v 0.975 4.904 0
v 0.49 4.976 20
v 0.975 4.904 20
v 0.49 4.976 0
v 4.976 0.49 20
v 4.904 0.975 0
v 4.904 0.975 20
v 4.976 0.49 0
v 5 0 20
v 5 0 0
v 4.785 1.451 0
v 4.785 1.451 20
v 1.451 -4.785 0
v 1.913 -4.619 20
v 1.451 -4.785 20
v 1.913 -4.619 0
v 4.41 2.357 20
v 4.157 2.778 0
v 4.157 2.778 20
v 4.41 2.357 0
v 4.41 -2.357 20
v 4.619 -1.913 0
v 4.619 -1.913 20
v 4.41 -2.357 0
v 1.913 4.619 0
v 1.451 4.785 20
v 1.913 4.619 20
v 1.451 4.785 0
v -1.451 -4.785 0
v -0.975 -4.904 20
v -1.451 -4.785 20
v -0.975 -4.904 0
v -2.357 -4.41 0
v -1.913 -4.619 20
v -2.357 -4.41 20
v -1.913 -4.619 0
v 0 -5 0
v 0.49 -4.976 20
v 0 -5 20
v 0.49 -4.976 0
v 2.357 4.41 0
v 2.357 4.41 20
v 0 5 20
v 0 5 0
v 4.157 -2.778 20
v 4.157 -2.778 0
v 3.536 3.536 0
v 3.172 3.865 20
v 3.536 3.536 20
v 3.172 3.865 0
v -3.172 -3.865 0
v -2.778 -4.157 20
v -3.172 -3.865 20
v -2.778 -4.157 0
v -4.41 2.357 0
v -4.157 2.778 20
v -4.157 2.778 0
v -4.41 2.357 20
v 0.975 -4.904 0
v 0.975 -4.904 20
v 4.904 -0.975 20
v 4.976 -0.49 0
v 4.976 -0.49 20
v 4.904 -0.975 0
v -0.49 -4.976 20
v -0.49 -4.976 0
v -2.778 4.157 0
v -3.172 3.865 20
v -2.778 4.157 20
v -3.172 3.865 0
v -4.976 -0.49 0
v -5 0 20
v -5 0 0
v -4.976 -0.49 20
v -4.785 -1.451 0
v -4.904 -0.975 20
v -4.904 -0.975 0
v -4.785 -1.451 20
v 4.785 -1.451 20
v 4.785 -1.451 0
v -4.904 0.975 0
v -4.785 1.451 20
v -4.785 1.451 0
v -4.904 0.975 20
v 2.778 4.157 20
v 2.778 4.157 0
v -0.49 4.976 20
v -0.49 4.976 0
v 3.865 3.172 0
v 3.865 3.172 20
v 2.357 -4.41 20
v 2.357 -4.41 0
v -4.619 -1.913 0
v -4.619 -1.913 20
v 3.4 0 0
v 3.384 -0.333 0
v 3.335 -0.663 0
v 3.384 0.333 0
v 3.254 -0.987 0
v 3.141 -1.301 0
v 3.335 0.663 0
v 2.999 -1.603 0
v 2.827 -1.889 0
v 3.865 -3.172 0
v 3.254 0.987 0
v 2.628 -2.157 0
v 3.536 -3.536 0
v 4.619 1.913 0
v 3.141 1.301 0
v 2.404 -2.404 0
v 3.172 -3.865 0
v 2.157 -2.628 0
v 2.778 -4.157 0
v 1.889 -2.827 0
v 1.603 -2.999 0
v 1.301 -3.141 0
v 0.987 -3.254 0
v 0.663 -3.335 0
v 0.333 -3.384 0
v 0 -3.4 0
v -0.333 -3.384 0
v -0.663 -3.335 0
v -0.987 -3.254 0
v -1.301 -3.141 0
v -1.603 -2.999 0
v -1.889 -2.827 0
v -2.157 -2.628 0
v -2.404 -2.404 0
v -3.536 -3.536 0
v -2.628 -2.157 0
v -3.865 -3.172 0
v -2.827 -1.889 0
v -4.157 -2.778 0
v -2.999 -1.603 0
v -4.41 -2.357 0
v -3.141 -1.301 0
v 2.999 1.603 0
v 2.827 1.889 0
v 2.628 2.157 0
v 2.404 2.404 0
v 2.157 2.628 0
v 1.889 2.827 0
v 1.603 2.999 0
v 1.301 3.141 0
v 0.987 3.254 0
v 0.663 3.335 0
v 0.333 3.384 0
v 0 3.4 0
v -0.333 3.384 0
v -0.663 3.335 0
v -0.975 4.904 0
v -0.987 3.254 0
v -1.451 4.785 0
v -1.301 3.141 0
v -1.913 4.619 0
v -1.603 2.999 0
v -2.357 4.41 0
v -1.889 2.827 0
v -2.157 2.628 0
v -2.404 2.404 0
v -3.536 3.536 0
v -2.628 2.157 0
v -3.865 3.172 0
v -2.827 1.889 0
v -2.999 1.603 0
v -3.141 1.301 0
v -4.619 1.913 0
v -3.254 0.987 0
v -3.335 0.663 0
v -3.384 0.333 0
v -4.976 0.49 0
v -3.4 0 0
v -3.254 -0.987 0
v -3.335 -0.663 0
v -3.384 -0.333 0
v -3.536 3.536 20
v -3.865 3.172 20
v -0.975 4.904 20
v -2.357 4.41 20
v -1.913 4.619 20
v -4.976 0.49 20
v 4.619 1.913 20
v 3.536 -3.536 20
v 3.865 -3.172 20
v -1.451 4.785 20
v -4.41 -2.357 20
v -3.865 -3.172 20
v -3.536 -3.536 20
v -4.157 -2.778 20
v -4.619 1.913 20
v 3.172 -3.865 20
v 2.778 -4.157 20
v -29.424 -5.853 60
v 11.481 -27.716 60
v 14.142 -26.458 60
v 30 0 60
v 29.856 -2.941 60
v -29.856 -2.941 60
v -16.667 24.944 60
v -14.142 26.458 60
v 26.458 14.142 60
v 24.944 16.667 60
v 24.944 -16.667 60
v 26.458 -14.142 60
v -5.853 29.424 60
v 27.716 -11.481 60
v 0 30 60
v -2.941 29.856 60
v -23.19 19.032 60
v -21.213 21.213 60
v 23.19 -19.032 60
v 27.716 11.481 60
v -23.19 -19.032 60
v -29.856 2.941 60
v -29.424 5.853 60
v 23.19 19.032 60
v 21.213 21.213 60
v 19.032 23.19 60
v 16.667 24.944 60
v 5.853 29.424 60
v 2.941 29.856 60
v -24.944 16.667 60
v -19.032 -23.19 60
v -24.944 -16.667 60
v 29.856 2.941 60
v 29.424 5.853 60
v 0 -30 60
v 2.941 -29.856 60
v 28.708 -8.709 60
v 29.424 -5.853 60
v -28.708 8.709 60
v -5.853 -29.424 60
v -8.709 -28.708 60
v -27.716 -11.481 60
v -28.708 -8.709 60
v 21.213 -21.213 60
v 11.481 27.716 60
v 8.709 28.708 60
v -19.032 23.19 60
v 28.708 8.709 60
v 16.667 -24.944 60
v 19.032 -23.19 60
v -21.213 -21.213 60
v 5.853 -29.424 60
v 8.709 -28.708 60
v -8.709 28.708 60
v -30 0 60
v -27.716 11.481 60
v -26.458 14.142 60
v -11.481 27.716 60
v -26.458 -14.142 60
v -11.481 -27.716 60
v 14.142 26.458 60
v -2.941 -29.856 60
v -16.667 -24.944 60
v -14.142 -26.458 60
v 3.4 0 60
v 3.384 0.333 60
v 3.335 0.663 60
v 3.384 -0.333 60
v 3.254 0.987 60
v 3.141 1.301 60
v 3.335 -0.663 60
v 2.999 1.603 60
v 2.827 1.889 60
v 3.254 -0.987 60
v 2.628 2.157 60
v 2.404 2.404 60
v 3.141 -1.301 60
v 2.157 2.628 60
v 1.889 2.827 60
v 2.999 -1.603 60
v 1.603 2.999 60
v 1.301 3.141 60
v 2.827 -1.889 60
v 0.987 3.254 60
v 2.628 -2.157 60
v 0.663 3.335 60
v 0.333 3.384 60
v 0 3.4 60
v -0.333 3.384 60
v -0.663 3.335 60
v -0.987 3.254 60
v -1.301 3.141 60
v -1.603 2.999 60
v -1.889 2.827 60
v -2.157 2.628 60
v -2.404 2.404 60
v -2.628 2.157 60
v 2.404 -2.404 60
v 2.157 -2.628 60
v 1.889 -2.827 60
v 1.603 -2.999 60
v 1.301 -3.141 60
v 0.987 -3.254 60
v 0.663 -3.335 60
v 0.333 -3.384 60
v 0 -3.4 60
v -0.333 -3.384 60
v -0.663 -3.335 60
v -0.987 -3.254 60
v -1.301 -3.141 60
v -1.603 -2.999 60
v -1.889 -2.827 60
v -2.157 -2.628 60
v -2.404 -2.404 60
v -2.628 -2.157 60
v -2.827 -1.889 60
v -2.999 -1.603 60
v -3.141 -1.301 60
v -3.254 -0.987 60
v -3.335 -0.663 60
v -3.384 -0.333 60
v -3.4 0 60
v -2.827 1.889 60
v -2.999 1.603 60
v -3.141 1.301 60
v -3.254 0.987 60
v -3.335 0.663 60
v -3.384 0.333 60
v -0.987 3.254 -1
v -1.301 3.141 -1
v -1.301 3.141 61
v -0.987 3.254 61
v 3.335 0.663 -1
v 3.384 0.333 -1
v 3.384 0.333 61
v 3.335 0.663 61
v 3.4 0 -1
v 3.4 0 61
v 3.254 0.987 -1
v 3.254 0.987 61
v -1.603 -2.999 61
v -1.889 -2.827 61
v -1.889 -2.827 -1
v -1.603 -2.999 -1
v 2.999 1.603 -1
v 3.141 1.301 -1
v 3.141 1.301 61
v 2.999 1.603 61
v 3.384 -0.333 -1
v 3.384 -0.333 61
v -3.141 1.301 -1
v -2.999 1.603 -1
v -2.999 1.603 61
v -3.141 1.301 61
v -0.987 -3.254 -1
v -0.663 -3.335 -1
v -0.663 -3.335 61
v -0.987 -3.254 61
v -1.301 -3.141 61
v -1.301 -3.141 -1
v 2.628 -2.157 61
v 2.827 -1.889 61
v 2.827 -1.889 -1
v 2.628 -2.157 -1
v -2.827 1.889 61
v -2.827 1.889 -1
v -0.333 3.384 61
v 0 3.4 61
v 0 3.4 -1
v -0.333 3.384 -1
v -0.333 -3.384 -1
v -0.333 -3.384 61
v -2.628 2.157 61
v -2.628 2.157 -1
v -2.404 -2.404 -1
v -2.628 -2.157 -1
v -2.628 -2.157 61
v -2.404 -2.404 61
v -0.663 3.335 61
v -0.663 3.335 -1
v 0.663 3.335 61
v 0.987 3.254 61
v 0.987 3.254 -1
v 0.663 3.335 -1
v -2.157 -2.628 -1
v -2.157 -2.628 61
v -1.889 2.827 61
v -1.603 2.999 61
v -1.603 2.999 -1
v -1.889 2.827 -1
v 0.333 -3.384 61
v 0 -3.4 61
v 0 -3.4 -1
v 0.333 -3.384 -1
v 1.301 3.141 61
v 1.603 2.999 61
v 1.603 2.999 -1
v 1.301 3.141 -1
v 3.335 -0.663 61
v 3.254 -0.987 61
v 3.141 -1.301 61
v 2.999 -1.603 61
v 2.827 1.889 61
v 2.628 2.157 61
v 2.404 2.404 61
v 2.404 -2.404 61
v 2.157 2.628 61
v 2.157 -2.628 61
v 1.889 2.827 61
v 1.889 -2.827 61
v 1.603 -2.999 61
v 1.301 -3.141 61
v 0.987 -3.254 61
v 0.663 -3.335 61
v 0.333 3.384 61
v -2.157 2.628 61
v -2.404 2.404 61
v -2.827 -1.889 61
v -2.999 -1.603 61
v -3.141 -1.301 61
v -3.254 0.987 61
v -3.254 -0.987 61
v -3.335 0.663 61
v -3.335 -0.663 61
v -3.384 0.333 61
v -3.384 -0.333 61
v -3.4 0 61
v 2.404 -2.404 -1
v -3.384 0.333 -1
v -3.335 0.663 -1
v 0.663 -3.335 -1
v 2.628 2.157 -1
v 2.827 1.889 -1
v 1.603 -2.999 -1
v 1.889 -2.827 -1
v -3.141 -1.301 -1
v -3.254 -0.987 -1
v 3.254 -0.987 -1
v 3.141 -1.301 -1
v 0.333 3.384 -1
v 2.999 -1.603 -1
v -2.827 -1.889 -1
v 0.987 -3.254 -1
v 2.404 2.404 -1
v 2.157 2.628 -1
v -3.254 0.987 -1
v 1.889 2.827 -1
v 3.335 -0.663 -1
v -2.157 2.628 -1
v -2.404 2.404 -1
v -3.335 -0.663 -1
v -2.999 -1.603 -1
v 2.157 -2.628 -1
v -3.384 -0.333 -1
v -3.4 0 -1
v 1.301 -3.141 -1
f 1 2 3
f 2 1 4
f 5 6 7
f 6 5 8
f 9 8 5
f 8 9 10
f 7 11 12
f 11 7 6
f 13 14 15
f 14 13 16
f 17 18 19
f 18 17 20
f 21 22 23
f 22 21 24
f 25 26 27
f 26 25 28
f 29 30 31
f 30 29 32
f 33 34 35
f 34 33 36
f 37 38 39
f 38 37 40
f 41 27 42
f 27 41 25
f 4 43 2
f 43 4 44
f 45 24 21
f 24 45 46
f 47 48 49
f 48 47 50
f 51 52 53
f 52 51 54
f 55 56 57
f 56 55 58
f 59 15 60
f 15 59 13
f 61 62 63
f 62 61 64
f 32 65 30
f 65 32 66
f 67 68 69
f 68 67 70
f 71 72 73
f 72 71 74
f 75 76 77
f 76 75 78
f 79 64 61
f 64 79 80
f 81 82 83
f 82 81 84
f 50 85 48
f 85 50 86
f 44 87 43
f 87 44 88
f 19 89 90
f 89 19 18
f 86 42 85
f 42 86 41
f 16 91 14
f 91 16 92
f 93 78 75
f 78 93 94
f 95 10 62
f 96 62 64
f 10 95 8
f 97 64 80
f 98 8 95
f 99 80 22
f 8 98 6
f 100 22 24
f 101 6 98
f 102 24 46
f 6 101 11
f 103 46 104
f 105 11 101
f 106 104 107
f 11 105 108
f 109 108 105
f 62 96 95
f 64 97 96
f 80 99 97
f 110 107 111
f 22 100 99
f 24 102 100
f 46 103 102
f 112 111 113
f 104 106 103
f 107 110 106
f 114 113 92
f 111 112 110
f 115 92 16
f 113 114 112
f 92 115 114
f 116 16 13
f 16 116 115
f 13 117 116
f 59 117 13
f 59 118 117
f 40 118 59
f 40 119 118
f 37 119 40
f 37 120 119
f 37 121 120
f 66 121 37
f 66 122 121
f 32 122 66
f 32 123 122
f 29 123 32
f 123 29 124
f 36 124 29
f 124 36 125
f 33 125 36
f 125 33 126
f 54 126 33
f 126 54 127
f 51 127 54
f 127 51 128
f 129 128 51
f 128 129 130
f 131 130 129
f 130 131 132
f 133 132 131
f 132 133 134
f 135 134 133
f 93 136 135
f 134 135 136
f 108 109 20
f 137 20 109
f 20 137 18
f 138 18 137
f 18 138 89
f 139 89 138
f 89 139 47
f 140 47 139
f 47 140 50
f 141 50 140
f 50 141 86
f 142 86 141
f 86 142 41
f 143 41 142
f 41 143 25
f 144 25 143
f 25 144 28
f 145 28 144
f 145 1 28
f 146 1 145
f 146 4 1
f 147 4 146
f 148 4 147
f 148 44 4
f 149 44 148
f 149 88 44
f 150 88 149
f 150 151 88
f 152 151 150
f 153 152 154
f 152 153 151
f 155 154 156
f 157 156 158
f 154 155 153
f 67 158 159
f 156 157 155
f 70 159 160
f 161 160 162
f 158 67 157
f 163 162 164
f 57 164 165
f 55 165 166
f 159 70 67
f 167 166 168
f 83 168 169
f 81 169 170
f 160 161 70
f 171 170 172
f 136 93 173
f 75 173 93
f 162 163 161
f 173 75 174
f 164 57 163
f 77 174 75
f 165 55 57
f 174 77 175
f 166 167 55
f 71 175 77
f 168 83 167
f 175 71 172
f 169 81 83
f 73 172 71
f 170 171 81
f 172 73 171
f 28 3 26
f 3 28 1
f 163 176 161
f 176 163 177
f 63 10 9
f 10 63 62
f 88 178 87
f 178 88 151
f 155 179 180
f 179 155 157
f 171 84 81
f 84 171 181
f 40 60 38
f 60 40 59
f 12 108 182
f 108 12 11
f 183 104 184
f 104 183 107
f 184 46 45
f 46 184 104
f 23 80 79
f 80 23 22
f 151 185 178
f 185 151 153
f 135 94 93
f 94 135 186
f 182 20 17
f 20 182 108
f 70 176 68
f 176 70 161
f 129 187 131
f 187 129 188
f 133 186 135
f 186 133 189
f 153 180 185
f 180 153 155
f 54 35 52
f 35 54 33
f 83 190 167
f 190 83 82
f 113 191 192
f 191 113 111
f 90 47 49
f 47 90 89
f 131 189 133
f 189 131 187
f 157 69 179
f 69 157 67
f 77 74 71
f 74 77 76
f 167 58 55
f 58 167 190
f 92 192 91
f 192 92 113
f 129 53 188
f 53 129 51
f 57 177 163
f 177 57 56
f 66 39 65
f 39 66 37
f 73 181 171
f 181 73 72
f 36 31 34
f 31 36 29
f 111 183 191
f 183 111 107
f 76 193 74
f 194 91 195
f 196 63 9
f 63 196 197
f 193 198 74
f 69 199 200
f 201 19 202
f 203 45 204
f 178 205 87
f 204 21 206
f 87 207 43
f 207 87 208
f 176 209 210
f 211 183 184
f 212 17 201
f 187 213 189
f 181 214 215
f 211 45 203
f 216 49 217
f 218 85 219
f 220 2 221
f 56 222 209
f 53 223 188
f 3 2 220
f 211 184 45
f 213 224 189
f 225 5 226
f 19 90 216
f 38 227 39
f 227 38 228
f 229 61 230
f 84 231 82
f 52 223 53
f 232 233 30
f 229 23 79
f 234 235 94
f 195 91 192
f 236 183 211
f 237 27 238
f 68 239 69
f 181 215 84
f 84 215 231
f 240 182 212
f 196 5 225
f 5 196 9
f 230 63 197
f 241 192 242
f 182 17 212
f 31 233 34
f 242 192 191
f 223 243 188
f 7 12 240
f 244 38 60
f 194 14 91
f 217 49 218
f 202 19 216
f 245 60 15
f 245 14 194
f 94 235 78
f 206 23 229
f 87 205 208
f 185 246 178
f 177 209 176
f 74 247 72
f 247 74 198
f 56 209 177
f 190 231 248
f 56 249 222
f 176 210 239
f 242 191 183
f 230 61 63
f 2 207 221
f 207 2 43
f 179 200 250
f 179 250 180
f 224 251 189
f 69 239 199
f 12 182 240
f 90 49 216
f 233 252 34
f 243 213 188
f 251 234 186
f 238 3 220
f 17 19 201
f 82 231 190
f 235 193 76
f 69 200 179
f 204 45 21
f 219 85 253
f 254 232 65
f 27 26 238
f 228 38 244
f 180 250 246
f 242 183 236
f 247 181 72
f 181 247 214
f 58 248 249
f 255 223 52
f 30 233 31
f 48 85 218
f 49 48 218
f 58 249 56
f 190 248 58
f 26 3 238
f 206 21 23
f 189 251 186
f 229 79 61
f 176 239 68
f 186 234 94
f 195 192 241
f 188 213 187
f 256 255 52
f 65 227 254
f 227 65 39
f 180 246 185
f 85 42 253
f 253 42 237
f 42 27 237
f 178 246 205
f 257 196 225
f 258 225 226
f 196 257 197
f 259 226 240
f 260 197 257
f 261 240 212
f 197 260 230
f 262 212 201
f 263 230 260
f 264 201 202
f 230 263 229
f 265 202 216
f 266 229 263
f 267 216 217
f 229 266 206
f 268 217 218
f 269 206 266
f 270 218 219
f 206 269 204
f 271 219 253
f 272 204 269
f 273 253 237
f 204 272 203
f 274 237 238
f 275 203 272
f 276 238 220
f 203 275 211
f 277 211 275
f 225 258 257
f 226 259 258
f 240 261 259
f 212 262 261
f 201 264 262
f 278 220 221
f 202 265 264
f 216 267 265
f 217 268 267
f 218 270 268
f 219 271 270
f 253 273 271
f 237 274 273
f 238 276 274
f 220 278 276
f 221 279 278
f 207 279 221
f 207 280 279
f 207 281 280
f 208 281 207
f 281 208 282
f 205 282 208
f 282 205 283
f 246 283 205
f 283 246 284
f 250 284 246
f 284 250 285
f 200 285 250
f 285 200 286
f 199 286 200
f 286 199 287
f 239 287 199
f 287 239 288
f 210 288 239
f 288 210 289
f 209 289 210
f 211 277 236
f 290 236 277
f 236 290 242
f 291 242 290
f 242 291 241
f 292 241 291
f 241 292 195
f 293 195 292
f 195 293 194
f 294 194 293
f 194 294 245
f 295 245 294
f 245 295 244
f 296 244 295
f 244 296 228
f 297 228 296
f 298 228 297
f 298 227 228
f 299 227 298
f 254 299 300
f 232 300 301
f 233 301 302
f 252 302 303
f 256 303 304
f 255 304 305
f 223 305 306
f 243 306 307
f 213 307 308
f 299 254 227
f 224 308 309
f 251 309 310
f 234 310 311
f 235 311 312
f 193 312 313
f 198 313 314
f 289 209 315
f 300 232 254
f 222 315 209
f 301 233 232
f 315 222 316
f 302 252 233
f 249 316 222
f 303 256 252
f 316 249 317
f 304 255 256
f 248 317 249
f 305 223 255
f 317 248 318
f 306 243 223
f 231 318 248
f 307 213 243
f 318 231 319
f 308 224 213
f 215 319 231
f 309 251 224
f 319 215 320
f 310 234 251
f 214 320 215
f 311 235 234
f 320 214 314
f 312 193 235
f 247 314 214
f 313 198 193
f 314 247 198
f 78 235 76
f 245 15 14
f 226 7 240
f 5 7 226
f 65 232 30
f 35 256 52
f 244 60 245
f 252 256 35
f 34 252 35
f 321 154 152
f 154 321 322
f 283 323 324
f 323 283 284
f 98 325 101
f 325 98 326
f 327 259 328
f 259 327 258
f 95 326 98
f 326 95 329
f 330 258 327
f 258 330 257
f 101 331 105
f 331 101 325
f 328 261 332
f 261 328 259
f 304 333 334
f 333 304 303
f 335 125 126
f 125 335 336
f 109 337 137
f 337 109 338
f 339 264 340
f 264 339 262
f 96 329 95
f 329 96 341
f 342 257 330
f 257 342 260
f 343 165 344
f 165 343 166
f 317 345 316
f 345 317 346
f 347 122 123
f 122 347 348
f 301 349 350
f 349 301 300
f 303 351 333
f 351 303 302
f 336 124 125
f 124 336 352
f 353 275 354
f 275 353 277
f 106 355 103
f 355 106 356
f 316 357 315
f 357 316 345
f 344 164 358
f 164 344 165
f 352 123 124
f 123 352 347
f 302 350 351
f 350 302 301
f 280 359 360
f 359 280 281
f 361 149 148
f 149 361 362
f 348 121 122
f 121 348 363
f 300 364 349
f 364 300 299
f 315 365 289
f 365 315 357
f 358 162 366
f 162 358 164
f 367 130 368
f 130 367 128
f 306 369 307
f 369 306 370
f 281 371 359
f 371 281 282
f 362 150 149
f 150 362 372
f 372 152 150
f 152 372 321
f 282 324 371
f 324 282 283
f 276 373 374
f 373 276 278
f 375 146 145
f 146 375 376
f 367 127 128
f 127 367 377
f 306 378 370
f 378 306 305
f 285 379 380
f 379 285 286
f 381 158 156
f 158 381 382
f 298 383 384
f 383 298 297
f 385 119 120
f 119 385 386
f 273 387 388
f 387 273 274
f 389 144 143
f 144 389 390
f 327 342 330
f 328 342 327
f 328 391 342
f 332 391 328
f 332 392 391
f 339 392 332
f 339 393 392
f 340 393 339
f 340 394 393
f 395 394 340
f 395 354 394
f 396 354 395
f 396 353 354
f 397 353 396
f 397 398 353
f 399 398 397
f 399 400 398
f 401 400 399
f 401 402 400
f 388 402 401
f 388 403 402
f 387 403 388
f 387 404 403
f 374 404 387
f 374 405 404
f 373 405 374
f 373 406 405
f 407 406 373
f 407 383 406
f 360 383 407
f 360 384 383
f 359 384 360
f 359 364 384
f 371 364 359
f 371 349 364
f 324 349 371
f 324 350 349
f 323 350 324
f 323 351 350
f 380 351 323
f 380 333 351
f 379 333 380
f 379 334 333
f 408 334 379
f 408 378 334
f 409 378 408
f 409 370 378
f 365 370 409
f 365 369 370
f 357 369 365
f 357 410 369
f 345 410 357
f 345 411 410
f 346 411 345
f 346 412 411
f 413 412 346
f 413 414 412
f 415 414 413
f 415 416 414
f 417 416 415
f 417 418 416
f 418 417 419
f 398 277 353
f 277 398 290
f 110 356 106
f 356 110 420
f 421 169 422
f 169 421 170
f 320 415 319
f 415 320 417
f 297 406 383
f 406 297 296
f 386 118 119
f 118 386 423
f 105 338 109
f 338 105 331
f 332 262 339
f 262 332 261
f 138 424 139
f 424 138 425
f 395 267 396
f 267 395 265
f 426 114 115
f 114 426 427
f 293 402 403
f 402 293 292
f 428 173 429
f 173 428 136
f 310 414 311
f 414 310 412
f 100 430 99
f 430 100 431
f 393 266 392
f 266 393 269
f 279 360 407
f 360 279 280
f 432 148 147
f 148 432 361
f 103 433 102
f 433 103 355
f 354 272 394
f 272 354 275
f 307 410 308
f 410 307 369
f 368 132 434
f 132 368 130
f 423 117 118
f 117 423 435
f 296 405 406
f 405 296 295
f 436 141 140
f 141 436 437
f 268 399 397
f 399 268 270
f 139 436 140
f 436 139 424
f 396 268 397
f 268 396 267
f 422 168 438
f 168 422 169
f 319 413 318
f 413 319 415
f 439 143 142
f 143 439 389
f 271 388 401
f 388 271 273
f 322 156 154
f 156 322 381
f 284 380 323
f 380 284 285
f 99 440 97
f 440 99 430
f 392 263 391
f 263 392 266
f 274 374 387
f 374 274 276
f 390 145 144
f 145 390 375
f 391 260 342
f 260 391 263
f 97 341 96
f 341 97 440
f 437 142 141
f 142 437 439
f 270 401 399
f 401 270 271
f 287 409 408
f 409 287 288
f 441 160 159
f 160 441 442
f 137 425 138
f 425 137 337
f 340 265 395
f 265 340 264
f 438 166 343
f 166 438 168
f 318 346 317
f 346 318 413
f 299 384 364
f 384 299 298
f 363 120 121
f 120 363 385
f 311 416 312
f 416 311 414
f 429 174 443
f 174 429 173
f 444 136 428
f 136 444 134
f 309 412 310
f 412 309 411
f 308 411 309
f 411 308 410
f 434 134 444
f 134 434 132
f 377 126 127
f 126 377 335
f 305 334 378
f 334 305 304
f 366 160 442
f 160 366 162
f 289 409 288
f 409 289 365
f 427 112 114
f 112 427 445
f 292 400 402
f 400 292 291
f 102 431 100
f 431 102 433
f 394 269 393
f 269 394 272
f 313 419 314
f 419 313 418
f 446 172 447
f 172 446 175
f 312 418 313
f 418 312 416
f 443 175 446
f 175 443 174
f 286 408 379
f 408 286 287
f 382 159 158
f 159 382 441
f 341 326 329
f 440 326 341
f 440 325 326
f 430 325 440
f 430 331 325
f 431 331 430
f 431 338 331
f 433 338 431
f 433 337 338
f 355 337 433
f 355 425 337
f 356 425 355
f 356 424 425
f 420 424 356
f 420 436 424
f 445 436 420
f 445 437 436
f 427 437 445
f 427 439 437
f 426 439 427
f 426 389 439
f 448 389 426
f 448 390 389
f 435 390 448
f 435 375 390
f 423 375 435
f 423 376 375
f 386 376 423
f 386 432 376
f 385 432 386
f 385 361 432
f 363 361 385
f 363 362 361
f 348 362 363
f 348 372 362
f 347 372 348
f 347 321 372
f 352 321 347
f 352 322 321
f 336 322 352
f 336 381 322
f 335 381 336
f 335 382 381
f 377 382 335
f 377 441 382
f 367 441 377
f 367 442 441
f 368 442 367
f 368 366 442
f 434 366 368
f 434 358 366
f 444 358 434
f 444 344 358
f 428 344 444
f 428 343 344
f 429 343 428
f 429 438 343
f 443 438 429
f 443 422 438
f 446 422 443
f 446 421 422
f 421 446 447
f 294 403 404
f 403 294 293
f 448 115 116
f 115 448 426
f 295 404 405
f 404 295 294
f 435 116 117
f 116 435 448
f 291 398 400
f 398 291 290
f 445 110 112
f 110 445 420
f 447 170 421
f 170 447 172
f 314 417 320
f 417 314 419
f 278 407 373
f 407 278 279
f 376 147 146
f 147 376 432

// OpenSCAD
// Lab funnel - printed upright, open top and bottom
// Units: mm

$fn = 64;

// --- Dimensions ---
spout_od      = 10;   // spout outer diameter
spout_length  = 20;   // spout runs from z = 0 to z = 20
cone_top_d    = 60;   // cone rim diameter at z = 50
cone_bottom_d = 10;   // cone diameter at z = 20 (spout top)
wall          = 1.6;  // wall thickness everywhere

// Derived
spout_id = spout_od - 2 * wall;  // bore diameter = 6.8

// --- Model ---
union() {
    // Straight spout
    translate([0, 0, 0])
        cylinder(d = spout_od, h = spout_length);

    // Cone from z = 20 to z = 50
    translate([0, 0, spout_length])
        cylinder(d1 = cone_bottom_d, d2 = cone_top_d, h = cone_top_d - spout_length);
}

// --- Cut out bore (through the whole part) ---
translate([0, 0, -1])
    cylinder(d = spout_id, h = cone_top_d + 2);
